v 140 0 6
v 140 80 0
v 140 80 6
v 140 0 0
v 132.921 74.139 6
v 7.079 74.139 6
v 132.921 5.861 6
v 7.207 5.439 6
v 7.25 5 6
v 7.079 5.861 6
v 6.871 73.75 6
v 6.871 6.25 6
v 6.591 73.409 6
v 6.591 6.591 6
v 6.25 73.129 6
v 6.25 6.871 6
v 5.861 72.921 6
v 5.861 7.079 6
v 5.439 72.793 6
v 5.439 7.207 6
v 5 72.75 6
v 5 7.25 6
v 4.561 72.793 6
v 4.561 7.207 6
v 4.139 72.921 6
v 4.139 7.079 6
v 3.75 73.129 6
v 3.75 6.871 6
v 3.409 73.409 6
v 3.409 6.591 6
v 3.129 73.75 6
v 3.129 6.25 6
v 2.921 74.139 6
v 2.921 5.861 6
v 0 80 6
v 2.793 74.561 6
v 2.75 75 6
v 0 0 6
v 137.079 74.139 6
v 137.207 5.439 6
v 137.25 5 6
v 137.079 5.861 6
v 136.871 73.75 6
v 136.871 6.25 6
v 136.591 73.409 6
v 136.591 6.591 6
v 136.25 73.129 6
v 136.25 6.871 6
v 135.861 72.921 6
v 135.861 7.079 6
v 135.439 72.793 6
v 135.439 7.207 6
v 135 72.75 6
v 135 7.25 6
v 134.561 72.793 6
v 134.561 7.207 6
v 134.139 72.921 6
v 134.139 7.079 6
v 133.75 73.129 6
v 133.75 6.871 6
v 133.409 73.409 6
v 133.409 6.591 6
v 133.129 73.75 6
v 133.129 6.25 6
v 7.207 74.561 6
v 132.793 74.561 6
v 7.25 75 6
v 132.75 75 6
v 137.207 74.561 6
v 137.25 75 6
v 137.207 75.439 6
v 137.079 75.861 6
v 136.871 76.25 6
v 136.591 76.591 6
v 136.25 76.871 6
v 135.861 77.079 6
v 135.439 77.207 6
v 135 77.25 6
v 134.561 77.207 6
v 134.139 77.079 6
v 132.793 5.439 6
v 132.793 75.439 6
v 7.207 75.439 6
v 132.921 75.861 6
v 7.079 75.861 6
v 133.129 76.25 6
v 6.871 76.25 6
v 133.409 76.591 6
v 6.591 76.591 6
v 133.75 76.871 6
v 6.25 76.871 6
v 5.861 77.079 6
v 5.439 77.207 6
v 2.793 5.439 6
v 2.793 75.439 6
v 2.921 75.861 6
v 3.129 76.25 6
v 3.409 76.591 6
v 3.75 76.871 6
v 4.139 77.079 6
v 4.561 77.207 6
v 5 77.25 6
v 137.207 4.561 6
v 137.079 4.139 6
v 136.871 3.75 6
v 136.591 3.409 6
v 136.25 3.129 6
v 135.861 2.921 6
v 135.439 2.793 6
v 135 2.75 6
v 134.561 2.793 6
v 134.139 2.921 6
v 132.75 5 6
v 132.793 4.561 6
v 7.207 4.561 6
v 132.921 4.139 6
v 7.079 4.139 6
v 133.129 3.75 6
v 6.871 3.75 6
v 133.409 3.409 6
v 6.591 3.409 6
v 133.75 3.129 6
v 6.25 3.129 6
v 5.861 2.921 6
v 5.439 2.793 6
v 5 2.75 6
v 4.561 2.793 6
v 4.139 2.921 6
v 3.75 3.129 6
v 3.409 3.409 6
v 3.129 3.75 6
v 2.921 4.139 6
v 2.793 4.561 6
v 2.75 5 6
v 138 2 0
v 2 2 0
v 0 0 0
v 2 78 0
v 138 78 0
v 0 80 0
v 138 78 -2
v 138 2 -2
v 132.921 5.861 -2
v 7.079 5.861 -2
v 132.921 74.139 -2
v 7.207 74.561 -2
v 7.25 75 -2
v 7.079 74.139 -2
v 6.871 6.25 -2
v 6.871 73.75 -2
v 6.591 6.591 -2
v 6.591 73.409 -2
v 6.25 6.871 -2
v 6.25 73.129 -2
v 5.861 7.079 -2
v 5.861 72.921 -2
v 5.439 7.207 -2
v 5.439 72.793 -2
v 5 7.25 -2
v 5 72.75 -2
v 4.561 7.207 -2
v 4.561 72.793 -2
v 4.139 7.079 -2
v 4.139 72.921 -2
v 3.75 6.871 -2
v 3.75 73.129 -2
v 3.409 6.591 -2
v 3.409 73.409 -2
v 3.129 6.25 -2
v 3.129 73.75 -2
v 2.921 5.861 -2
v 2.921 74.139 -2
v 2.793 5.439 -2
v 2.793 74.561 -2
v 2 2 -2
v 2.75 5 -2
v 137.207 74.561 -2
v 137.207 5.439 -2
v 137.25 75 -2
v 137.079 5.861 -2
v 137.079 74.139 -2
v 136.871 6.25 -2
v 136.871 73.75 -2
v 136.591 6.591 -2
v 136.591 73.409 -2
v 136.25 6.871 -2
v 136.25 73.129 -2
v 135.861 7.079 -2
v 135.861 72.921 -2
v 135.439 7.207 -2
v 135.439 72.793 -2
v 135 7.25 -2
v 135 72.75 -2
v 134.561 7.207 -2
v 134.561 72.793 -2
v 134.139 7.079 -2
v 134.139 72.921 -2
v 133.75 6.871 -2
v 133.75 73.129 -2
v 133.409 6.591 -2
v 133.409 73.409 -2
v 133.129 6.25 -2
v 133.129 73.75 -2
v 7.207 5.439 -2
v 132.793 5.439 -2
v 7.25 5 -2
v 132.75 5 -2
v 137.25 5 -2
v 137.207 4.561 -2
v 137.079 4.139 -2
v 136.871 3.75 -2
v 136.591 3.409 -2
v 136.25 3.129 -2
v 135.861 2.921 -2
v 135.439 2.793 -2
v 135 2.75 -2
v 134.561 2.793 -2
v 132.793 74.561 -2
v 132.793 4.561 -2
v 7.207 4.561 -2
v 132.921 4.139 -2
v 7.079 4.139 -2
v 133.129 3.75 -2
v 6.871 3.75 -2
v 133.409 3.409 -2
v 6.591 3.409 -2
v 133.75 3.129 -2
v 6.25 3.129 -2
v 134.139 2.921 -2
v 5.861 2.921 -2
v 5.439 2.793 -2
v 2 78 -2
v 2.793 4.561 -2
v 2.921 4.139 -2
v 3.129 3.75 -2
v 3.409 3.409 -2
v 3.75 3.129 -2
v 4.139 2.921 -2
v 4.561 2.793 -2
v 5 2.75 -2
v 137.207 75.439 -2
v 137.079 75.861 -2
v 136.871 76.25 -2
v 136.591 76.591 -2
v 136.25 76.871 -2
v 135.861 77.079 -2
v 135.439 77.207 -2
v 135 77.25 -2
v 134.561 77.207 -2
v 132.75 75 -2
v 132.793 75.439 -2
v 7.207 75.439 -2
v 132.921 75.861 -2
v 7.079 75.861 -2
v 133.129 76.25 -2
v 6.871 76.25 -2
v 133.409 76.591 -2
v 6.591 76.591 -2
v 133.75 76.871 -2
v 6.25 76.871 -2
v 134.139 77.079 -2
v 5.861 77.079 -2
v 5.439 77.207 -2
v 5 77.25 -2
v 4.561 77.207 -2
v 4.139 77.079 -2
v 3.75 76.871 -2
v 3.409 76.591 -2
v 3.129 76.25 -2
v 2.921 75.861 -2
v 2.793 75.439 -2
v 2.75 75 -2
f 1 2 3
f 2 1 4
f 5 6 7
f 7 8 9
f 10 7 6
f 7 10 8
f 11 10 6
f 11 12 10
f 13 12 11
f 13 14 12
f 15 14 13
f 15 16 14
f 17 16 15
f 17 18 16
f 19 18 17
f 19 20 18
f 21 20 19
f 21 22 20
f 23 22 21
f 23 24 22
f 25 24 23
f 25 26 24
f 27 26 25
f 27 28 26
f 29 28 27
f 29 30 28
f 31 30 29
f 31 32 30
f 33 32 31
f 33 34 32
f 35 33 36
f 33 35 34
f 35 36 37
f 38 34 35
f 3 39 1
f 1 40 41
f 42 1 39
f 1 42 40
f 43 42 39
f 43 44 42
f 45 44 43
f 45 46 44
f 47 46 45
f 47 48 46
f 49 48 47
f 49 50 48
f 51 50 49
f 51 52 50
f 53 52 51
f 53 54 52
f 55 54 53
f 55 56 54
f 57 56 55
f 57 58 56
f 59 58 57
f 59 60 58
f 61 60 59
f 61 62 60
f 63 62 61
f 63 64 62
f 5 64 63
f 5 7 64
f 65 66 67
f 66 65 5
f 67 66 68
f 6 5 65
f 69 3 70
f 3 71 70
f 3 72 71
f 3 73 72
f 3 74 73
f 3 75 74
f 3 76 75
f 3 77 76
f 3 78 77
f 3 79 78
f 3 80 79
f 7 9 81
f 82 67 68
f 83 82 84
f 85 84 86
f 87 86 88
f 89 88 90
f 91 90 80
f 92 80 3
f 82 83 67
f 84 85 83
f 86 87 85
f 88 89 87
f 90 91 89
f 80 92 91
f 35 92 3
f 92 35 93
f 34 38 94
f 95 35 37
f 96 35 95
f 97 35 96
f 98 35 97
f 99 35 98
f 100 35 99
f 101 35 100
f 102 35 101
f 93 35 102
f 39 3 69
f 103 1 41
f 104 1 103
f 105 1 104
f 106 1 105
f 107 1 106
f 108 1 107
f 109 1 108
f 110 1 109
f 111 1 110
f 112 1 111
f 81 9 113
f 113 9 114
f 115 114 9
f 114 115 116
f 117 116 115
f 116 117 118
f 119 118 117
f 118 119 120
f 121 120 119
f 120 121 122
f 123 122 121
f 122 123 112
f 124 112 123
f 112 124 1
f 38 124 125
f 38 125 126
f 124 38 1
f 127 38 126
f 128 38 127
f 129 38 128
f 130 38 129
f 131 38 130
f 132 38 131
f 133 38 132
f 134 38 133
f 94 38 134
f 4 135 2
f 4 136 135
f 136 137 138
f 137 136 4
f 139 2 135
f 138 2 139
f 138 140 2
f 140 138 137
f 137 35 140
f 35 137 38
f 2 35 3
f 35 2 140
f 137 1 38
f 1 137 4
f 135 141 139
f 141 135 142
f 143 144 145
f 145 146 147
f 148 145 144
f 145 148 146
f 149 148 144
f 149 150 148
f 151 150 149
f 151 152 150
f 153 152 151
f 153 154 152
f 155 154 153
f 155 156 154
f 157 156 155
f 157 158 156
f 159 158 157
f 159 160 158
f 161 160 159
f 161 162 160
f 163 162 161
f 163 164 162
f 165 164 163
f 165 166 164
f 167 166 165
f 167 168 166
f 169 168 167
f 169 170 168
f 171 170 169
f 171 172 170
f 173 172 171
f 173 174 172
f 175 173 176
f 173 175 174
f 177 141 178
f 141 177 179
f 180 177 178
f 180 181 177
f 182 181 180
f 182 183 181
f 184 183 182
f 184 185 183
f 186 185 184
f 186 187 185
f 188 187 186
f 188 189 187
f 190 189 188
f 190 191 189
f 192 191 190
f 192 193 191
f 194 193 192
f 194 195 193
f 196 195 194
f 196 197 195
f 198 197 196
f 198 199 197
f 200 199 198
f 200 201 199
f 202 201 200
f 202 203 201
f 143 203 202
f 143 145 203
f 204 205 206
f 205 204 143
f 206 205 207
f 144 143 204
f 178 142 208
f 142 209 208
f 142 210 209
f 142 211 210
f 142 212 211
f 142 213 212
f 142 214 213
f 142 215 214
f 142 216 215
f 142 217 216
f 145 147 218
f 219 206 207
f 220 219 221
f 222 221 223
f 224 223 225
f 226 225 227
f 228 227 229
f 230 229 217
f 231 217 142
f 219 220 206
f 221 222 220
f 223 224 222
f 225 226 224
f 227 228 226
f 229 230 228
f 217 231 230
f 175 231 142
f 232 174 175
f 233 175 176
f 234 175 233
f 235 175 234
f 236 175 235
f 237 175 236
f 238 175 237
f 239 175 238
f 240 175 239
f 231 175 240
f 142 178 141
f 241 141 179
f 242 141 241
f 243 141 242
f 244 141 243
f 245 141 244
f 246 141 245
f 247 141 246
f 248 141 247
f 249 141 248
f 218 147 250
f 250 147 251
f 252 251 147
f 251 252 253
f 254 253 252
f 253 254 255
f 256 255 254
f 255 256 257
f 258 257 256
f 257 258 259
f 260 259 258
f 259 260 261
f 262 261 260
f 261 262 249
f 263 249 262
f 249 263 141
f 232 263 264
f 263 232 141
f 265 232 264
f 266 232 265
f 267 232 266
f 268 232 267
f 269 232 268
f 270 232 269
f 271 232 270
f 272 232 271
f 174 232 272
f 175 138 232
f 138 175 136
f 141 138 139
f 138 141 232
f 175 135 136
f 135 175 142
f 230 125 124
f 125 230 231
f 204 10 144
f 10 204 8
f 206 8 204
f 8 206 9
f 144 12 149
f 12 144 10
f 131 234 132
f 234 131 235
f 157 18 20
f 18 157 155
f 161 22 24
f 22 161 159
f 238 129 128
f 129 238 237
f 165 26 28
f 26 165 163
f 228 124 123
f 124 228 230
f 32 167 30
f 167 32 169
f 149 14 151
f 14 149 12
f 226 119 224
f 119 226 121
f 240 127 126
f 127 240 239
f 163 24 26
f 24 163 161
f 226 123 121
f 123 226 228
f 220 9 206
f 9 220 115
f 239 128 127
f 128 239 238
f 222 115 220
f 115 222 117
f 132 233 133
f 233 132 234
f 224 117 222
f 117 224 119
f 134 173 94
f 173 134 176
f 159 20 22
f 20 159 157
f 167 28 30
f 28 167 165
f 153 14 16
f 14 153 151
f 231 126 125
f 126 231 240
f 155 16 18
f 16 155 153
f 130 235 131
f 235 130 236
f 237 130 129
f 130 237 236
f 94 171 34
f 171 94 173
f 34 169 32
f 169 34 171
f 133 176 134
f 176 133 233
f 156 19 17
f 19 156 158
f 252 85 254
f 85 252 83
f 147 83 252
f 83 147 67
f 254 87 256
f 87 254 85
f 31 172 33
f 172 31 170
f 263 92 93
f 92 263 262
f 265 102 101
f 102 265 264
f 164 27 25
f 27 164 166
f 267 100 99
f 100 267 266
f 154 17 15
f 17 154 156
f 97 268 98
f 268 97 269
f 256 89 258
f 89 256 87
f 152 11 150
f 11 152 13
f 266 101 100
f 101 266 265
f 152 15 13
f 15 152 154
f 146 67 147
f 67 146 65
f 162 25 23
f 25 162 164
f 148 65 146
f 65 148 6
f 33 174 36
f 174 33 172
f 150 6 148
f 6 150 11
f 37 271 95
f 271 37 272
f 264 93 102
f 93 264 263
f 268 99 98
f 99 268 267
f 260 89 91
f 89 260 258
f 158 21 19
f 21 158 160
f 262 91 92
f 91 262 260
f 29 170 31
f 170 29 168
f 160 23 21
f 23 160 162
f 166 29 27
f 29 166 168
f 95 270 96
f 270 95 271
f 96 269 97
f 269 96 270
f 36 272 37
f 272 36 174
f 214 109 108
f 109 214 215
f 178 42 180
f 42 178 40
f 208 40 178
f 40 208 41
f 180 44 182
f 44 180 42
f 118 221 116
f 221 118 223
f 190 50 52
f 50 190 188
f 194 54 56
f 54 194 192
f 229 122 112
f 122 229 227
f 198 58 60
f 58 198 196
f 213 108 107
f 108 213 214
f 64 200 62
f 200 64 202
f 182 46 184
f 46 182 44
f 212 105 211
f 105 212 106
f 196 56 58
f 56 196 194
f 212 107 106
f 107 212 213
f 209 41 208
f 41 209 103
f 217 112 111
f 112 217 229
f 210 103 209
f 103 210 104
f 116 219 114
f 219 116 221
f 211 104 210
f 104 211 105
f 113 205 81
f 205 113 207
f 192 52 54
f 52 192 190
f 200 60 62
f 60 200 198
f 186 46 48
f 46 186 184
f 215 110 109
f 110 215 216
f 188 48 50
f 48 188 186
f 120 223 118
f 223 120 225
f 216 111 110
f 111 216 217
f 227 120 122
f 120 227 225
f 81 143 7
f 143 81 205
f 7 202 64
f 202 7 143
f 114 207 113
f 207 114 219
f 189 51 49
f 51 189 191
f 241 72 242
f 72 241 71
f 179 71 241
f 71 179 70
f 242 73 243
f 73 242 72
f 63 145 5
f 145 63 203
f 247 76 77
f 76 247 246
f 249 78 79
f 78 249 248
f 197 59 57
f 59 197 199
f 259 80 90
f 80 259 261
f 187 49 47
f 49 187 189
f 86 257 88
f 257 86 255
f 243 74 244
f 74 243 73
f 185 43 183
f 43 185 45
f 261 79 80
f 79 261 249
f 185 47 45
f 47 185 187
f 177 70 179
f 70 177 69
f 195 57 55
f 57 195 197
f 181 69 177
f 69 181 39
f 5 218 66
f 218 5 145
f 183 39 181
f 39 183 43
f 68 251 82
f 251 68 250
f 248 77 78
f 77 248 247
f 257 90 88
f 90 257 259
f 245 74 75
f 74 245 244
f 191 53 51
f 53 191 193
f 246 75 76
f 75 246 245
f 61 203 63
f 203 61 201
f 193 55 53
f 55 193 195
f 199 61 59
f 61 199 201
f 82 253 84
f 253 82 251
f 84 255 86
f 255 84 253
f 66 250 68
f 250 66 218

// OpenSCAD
$fn = 32;

// ----------------------------------------------------------------------
// Enclosure lid: 140 x 80 x 6 mm, 4 bolt holes
// ----------------------------------------------------------------------

// --- parameters (mm) ---
length = 140;             // lid length, X
width = 80;               // lid width, Y
plate_t = 6;              // lid plate thickness
bolt_d = 4.5;             // bolt clearance
boss_lip = 5;             // bolt hole inset from the corner
sink = 1;                 // overlap of the lip and ribs into the plate
lip_h = 3;                // lip height below the plate
lip_wall = 2;             // lip wall thickness

module plate() {
  cube([length, width, plate_t]);
  /* lip that drops into the housing opening, sunk into the plate */
  translate([lip_wall, lip_wall, -lip_h + sink]) cube([length - 2 * lip_wall, width - 2 * lip_wall, lip_h]);
}

difference() {
  plate();
  /* bolt pattern matching the corner bosses */
  for (sx = [0, 1]) for (sy = [0, 1])
    translate([sx * (length - 2 * boss_lip) + boss_lip, sy * (width - 2 * boss_lip) + boss_lip, -lip_h - 1])
      cylinder(h = plate_t + lip_h + 2, d = bolt_d);
}
